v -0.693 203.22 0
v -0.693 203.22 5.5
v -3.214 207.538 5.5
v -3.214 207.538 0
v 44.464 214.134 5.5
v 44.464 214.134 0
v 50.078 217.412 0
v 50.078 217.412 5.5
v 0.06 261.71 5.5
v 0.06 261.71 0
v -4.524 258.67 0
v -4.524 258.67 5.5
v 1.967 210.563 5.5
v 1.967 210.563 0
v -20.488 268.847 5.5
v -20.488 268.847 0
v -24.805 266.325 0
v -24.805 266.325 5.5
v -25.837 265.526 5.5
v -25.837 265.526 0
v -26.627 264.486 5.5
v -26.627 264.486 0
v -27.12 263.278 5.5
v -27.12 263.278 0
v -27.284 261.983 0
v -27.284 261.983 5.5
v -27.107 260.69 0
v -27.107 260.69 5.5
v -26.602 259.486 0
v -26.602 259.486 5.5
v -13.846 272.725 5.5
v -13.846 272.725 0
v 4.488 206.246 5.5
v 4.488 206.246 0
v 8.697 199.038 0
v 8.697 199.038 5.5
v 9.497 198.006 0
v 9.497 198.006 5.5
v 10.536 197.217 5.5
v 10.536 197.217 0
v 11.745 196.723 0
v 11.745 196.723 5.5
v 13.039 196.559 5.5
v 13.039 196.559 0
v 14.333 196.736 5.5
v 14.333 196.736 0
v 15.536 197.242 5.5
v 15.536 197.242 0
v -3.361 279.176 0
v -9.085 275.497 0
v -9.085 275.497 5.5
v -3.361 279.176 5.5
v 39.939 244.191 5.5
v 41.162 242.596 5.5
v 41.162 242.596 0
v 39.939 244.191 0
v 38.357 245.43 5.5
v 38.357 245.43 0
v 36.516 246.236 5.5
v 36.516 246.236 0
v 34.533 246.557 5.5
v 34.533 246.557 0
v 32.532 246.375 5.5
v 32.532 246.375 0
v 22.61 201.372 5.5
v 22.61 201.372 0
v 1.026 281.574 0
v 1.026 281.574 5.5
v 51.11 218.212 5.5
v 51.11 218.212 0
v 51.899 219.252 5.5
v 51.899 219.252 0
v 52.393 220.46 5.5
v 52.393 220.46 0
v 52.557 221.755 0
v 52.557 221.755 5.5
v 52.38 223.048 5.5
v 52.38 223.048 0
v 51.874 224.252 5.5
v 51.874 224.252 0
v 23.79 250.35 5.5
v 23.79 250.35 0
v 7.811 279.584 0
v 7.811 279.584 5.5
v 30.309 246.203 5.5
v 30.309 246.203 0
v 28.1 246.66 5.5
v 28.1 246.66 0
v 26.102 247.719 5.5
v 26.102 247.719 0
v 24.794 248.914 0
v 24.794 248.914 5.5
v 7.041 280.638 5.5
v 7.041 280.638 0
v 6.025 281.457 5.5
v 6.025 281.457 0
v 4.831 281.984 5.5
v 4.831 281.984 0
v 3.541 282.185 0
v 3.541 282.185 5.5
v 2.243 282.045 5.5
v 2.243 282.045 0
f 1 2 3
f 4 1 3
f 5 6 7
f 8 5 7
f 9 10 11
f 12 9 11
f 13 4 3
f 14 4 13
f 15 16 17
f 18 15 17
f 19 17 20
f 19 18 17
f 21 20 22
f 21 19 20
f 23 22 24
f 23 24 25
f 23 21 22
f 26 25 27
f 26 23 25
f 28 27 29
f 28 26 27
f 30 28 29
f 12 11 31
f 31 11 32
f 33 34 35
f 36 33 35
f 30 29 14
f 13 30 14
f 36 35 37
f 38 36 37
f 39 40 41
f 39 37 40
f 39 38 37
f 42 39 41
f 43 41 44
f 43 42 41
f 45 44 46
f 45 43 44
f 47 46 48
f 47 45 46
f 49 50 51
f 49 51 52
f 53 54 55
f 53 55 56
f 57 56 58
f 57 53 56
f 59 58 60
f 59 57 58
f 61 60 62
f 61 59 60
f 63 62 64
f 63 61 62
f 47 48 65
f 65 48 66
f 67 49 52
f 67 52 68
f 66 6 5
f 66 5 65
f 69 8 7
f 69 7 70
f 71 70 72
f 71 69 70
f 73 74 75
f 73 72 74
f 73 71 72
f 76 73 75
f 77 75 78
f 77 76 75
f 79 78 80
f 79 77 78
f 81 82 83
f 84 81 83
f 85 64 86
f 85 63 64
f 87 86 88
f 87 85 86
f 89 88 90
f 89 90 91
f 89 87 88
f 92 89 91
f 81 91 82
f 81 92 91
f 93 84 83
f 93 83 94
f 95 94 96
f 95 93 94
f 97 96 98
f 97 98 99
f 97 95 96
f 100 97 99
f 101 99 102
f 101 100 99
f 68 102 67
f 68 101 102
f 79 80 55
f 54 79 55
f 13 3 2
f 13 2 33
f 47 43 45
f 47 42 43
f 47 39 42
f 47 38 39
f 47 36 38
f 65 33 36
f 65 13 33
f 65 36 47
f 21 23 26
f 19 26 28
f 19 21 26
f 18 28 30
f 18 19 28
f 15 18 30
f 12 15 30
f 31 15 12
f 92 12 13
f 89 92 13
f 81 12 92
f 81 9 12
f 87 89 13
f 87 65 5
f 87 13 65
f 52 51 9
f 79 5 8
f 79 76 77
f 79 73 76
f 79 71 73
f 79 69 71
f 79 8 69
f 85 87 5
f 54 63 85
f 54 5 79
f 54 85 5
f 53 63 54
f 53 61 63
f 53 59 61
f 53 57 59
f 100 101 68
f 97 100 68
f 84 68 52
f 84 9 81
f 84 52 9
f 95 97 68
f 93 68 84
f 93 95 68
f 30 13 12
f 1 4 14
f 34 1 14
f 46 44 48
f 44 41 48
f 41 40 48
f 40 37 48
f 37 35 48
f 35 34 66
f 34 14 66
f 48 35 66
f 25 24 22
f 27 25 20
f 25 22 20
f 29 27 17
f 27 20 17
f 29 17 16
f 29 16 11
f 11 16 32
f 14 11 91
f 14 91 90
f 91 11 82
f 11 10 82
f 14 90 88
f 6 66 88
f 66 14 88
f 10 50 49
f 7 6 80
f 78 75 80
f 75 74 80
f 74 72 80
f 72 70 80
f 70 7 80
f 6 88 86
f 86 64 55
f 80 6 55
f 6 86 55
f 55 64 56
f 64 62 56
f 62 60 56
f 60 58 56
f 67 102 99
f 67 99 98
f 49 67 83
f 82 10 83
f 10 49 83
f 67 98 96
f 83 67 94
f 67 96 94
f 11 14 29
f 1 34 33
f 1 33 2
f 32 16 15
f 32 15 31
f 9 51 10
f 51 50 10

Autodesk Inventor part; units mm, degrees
ref_plane "YZ Plane" through (0, 0, 0) normal (1, 0, 0) x (0, 1, 0)
ref_plane "XZ Plane" through (0, 0, 0) normal (0, 1, 0) x (-1, 0, 0)
ref_plane "XY Plane" through (0, 0, 0) normal (0, 0, 1) x (1, 0, 0)
sketch "Sketch1" plane through (0, 0, 0) normal (0, 0, 1) x (1, 0, 0)
  line L0 (-9.0847, 275.4971) -> (0.0597, 261.7096)
  line L1 (0.0597, 261.7096) -> (-4.5238, 258.6697)
  line L2 (-4.5238, 258.6697) -> (-13.846, 272.7251)
  line L3 (-20.4878, 268.8466) -> (-13.846, 272.7251)
  line L4 (-9.0847, 275.4971) -> (-3.3614, 279.1755)
  line L5 (-20.4878, 268.8466) -> (-29.1232, 263.8039)
  line L6 (-3.3614, 279.1755) -> (5.4134, 283.9717)
  line L7 (11.2184, 194.7202) -> (22.61, 201.3724)
  line L8 (44.4638, 214.134) -> (54.3957, 219.9338)
  line L9 (4.4881, 206.2457) -> (-0.6932, 203.2201)
  line L10 (-0.6932, 203.2201) -> (-3.2145, 207.5378)
  line L11 (-3.2145, 207.5378) -> (1.9667, 210.5634)
  line L12 (-29.1232, 263.8039) -> (1.9667, 210.5634)
  line L13 (4.4881, 206.2457) -> (11.2184, 194.7202)
  line L14 (54.3957, 219.9338) -> (37.2403, 249.3118)
  line L15 (37.2403, 249.3118) -> (27.3211, 243.8901)
  line L16 (27.3211, 243.8901) -> (5.4134, 283.9717)
  line L17 (44.4638, 214.134) -> (22.61, 201.3724)
  point P0 (0, 0)
  dimension "d11" = 20
  dimension "d12" = 5.5
  dimension "d13" = 10
  dimension "d14" = 80
  dimension "d15" = 50
  dimension "d16" = 10
  dimension "d17" = 6
  dimension "d18" = 5
extrude "Extrusion1" add sketch "Sketch1" along normal blind 5.5
fillet "Fillet2" radius 8 2 edges at (37.2403, 249.3118, 2.75) (27.3211, 243.8901, 2.75)
fillet "Fillet3" radius 5 4 edges at (5.4134, 283.9717, 2.75) (54.3957, 219.9338, 2.75) (11.2184, 194.7202, 2.75) (-29.1232, 263.8039, 2.75)
properties part number "adelante"
